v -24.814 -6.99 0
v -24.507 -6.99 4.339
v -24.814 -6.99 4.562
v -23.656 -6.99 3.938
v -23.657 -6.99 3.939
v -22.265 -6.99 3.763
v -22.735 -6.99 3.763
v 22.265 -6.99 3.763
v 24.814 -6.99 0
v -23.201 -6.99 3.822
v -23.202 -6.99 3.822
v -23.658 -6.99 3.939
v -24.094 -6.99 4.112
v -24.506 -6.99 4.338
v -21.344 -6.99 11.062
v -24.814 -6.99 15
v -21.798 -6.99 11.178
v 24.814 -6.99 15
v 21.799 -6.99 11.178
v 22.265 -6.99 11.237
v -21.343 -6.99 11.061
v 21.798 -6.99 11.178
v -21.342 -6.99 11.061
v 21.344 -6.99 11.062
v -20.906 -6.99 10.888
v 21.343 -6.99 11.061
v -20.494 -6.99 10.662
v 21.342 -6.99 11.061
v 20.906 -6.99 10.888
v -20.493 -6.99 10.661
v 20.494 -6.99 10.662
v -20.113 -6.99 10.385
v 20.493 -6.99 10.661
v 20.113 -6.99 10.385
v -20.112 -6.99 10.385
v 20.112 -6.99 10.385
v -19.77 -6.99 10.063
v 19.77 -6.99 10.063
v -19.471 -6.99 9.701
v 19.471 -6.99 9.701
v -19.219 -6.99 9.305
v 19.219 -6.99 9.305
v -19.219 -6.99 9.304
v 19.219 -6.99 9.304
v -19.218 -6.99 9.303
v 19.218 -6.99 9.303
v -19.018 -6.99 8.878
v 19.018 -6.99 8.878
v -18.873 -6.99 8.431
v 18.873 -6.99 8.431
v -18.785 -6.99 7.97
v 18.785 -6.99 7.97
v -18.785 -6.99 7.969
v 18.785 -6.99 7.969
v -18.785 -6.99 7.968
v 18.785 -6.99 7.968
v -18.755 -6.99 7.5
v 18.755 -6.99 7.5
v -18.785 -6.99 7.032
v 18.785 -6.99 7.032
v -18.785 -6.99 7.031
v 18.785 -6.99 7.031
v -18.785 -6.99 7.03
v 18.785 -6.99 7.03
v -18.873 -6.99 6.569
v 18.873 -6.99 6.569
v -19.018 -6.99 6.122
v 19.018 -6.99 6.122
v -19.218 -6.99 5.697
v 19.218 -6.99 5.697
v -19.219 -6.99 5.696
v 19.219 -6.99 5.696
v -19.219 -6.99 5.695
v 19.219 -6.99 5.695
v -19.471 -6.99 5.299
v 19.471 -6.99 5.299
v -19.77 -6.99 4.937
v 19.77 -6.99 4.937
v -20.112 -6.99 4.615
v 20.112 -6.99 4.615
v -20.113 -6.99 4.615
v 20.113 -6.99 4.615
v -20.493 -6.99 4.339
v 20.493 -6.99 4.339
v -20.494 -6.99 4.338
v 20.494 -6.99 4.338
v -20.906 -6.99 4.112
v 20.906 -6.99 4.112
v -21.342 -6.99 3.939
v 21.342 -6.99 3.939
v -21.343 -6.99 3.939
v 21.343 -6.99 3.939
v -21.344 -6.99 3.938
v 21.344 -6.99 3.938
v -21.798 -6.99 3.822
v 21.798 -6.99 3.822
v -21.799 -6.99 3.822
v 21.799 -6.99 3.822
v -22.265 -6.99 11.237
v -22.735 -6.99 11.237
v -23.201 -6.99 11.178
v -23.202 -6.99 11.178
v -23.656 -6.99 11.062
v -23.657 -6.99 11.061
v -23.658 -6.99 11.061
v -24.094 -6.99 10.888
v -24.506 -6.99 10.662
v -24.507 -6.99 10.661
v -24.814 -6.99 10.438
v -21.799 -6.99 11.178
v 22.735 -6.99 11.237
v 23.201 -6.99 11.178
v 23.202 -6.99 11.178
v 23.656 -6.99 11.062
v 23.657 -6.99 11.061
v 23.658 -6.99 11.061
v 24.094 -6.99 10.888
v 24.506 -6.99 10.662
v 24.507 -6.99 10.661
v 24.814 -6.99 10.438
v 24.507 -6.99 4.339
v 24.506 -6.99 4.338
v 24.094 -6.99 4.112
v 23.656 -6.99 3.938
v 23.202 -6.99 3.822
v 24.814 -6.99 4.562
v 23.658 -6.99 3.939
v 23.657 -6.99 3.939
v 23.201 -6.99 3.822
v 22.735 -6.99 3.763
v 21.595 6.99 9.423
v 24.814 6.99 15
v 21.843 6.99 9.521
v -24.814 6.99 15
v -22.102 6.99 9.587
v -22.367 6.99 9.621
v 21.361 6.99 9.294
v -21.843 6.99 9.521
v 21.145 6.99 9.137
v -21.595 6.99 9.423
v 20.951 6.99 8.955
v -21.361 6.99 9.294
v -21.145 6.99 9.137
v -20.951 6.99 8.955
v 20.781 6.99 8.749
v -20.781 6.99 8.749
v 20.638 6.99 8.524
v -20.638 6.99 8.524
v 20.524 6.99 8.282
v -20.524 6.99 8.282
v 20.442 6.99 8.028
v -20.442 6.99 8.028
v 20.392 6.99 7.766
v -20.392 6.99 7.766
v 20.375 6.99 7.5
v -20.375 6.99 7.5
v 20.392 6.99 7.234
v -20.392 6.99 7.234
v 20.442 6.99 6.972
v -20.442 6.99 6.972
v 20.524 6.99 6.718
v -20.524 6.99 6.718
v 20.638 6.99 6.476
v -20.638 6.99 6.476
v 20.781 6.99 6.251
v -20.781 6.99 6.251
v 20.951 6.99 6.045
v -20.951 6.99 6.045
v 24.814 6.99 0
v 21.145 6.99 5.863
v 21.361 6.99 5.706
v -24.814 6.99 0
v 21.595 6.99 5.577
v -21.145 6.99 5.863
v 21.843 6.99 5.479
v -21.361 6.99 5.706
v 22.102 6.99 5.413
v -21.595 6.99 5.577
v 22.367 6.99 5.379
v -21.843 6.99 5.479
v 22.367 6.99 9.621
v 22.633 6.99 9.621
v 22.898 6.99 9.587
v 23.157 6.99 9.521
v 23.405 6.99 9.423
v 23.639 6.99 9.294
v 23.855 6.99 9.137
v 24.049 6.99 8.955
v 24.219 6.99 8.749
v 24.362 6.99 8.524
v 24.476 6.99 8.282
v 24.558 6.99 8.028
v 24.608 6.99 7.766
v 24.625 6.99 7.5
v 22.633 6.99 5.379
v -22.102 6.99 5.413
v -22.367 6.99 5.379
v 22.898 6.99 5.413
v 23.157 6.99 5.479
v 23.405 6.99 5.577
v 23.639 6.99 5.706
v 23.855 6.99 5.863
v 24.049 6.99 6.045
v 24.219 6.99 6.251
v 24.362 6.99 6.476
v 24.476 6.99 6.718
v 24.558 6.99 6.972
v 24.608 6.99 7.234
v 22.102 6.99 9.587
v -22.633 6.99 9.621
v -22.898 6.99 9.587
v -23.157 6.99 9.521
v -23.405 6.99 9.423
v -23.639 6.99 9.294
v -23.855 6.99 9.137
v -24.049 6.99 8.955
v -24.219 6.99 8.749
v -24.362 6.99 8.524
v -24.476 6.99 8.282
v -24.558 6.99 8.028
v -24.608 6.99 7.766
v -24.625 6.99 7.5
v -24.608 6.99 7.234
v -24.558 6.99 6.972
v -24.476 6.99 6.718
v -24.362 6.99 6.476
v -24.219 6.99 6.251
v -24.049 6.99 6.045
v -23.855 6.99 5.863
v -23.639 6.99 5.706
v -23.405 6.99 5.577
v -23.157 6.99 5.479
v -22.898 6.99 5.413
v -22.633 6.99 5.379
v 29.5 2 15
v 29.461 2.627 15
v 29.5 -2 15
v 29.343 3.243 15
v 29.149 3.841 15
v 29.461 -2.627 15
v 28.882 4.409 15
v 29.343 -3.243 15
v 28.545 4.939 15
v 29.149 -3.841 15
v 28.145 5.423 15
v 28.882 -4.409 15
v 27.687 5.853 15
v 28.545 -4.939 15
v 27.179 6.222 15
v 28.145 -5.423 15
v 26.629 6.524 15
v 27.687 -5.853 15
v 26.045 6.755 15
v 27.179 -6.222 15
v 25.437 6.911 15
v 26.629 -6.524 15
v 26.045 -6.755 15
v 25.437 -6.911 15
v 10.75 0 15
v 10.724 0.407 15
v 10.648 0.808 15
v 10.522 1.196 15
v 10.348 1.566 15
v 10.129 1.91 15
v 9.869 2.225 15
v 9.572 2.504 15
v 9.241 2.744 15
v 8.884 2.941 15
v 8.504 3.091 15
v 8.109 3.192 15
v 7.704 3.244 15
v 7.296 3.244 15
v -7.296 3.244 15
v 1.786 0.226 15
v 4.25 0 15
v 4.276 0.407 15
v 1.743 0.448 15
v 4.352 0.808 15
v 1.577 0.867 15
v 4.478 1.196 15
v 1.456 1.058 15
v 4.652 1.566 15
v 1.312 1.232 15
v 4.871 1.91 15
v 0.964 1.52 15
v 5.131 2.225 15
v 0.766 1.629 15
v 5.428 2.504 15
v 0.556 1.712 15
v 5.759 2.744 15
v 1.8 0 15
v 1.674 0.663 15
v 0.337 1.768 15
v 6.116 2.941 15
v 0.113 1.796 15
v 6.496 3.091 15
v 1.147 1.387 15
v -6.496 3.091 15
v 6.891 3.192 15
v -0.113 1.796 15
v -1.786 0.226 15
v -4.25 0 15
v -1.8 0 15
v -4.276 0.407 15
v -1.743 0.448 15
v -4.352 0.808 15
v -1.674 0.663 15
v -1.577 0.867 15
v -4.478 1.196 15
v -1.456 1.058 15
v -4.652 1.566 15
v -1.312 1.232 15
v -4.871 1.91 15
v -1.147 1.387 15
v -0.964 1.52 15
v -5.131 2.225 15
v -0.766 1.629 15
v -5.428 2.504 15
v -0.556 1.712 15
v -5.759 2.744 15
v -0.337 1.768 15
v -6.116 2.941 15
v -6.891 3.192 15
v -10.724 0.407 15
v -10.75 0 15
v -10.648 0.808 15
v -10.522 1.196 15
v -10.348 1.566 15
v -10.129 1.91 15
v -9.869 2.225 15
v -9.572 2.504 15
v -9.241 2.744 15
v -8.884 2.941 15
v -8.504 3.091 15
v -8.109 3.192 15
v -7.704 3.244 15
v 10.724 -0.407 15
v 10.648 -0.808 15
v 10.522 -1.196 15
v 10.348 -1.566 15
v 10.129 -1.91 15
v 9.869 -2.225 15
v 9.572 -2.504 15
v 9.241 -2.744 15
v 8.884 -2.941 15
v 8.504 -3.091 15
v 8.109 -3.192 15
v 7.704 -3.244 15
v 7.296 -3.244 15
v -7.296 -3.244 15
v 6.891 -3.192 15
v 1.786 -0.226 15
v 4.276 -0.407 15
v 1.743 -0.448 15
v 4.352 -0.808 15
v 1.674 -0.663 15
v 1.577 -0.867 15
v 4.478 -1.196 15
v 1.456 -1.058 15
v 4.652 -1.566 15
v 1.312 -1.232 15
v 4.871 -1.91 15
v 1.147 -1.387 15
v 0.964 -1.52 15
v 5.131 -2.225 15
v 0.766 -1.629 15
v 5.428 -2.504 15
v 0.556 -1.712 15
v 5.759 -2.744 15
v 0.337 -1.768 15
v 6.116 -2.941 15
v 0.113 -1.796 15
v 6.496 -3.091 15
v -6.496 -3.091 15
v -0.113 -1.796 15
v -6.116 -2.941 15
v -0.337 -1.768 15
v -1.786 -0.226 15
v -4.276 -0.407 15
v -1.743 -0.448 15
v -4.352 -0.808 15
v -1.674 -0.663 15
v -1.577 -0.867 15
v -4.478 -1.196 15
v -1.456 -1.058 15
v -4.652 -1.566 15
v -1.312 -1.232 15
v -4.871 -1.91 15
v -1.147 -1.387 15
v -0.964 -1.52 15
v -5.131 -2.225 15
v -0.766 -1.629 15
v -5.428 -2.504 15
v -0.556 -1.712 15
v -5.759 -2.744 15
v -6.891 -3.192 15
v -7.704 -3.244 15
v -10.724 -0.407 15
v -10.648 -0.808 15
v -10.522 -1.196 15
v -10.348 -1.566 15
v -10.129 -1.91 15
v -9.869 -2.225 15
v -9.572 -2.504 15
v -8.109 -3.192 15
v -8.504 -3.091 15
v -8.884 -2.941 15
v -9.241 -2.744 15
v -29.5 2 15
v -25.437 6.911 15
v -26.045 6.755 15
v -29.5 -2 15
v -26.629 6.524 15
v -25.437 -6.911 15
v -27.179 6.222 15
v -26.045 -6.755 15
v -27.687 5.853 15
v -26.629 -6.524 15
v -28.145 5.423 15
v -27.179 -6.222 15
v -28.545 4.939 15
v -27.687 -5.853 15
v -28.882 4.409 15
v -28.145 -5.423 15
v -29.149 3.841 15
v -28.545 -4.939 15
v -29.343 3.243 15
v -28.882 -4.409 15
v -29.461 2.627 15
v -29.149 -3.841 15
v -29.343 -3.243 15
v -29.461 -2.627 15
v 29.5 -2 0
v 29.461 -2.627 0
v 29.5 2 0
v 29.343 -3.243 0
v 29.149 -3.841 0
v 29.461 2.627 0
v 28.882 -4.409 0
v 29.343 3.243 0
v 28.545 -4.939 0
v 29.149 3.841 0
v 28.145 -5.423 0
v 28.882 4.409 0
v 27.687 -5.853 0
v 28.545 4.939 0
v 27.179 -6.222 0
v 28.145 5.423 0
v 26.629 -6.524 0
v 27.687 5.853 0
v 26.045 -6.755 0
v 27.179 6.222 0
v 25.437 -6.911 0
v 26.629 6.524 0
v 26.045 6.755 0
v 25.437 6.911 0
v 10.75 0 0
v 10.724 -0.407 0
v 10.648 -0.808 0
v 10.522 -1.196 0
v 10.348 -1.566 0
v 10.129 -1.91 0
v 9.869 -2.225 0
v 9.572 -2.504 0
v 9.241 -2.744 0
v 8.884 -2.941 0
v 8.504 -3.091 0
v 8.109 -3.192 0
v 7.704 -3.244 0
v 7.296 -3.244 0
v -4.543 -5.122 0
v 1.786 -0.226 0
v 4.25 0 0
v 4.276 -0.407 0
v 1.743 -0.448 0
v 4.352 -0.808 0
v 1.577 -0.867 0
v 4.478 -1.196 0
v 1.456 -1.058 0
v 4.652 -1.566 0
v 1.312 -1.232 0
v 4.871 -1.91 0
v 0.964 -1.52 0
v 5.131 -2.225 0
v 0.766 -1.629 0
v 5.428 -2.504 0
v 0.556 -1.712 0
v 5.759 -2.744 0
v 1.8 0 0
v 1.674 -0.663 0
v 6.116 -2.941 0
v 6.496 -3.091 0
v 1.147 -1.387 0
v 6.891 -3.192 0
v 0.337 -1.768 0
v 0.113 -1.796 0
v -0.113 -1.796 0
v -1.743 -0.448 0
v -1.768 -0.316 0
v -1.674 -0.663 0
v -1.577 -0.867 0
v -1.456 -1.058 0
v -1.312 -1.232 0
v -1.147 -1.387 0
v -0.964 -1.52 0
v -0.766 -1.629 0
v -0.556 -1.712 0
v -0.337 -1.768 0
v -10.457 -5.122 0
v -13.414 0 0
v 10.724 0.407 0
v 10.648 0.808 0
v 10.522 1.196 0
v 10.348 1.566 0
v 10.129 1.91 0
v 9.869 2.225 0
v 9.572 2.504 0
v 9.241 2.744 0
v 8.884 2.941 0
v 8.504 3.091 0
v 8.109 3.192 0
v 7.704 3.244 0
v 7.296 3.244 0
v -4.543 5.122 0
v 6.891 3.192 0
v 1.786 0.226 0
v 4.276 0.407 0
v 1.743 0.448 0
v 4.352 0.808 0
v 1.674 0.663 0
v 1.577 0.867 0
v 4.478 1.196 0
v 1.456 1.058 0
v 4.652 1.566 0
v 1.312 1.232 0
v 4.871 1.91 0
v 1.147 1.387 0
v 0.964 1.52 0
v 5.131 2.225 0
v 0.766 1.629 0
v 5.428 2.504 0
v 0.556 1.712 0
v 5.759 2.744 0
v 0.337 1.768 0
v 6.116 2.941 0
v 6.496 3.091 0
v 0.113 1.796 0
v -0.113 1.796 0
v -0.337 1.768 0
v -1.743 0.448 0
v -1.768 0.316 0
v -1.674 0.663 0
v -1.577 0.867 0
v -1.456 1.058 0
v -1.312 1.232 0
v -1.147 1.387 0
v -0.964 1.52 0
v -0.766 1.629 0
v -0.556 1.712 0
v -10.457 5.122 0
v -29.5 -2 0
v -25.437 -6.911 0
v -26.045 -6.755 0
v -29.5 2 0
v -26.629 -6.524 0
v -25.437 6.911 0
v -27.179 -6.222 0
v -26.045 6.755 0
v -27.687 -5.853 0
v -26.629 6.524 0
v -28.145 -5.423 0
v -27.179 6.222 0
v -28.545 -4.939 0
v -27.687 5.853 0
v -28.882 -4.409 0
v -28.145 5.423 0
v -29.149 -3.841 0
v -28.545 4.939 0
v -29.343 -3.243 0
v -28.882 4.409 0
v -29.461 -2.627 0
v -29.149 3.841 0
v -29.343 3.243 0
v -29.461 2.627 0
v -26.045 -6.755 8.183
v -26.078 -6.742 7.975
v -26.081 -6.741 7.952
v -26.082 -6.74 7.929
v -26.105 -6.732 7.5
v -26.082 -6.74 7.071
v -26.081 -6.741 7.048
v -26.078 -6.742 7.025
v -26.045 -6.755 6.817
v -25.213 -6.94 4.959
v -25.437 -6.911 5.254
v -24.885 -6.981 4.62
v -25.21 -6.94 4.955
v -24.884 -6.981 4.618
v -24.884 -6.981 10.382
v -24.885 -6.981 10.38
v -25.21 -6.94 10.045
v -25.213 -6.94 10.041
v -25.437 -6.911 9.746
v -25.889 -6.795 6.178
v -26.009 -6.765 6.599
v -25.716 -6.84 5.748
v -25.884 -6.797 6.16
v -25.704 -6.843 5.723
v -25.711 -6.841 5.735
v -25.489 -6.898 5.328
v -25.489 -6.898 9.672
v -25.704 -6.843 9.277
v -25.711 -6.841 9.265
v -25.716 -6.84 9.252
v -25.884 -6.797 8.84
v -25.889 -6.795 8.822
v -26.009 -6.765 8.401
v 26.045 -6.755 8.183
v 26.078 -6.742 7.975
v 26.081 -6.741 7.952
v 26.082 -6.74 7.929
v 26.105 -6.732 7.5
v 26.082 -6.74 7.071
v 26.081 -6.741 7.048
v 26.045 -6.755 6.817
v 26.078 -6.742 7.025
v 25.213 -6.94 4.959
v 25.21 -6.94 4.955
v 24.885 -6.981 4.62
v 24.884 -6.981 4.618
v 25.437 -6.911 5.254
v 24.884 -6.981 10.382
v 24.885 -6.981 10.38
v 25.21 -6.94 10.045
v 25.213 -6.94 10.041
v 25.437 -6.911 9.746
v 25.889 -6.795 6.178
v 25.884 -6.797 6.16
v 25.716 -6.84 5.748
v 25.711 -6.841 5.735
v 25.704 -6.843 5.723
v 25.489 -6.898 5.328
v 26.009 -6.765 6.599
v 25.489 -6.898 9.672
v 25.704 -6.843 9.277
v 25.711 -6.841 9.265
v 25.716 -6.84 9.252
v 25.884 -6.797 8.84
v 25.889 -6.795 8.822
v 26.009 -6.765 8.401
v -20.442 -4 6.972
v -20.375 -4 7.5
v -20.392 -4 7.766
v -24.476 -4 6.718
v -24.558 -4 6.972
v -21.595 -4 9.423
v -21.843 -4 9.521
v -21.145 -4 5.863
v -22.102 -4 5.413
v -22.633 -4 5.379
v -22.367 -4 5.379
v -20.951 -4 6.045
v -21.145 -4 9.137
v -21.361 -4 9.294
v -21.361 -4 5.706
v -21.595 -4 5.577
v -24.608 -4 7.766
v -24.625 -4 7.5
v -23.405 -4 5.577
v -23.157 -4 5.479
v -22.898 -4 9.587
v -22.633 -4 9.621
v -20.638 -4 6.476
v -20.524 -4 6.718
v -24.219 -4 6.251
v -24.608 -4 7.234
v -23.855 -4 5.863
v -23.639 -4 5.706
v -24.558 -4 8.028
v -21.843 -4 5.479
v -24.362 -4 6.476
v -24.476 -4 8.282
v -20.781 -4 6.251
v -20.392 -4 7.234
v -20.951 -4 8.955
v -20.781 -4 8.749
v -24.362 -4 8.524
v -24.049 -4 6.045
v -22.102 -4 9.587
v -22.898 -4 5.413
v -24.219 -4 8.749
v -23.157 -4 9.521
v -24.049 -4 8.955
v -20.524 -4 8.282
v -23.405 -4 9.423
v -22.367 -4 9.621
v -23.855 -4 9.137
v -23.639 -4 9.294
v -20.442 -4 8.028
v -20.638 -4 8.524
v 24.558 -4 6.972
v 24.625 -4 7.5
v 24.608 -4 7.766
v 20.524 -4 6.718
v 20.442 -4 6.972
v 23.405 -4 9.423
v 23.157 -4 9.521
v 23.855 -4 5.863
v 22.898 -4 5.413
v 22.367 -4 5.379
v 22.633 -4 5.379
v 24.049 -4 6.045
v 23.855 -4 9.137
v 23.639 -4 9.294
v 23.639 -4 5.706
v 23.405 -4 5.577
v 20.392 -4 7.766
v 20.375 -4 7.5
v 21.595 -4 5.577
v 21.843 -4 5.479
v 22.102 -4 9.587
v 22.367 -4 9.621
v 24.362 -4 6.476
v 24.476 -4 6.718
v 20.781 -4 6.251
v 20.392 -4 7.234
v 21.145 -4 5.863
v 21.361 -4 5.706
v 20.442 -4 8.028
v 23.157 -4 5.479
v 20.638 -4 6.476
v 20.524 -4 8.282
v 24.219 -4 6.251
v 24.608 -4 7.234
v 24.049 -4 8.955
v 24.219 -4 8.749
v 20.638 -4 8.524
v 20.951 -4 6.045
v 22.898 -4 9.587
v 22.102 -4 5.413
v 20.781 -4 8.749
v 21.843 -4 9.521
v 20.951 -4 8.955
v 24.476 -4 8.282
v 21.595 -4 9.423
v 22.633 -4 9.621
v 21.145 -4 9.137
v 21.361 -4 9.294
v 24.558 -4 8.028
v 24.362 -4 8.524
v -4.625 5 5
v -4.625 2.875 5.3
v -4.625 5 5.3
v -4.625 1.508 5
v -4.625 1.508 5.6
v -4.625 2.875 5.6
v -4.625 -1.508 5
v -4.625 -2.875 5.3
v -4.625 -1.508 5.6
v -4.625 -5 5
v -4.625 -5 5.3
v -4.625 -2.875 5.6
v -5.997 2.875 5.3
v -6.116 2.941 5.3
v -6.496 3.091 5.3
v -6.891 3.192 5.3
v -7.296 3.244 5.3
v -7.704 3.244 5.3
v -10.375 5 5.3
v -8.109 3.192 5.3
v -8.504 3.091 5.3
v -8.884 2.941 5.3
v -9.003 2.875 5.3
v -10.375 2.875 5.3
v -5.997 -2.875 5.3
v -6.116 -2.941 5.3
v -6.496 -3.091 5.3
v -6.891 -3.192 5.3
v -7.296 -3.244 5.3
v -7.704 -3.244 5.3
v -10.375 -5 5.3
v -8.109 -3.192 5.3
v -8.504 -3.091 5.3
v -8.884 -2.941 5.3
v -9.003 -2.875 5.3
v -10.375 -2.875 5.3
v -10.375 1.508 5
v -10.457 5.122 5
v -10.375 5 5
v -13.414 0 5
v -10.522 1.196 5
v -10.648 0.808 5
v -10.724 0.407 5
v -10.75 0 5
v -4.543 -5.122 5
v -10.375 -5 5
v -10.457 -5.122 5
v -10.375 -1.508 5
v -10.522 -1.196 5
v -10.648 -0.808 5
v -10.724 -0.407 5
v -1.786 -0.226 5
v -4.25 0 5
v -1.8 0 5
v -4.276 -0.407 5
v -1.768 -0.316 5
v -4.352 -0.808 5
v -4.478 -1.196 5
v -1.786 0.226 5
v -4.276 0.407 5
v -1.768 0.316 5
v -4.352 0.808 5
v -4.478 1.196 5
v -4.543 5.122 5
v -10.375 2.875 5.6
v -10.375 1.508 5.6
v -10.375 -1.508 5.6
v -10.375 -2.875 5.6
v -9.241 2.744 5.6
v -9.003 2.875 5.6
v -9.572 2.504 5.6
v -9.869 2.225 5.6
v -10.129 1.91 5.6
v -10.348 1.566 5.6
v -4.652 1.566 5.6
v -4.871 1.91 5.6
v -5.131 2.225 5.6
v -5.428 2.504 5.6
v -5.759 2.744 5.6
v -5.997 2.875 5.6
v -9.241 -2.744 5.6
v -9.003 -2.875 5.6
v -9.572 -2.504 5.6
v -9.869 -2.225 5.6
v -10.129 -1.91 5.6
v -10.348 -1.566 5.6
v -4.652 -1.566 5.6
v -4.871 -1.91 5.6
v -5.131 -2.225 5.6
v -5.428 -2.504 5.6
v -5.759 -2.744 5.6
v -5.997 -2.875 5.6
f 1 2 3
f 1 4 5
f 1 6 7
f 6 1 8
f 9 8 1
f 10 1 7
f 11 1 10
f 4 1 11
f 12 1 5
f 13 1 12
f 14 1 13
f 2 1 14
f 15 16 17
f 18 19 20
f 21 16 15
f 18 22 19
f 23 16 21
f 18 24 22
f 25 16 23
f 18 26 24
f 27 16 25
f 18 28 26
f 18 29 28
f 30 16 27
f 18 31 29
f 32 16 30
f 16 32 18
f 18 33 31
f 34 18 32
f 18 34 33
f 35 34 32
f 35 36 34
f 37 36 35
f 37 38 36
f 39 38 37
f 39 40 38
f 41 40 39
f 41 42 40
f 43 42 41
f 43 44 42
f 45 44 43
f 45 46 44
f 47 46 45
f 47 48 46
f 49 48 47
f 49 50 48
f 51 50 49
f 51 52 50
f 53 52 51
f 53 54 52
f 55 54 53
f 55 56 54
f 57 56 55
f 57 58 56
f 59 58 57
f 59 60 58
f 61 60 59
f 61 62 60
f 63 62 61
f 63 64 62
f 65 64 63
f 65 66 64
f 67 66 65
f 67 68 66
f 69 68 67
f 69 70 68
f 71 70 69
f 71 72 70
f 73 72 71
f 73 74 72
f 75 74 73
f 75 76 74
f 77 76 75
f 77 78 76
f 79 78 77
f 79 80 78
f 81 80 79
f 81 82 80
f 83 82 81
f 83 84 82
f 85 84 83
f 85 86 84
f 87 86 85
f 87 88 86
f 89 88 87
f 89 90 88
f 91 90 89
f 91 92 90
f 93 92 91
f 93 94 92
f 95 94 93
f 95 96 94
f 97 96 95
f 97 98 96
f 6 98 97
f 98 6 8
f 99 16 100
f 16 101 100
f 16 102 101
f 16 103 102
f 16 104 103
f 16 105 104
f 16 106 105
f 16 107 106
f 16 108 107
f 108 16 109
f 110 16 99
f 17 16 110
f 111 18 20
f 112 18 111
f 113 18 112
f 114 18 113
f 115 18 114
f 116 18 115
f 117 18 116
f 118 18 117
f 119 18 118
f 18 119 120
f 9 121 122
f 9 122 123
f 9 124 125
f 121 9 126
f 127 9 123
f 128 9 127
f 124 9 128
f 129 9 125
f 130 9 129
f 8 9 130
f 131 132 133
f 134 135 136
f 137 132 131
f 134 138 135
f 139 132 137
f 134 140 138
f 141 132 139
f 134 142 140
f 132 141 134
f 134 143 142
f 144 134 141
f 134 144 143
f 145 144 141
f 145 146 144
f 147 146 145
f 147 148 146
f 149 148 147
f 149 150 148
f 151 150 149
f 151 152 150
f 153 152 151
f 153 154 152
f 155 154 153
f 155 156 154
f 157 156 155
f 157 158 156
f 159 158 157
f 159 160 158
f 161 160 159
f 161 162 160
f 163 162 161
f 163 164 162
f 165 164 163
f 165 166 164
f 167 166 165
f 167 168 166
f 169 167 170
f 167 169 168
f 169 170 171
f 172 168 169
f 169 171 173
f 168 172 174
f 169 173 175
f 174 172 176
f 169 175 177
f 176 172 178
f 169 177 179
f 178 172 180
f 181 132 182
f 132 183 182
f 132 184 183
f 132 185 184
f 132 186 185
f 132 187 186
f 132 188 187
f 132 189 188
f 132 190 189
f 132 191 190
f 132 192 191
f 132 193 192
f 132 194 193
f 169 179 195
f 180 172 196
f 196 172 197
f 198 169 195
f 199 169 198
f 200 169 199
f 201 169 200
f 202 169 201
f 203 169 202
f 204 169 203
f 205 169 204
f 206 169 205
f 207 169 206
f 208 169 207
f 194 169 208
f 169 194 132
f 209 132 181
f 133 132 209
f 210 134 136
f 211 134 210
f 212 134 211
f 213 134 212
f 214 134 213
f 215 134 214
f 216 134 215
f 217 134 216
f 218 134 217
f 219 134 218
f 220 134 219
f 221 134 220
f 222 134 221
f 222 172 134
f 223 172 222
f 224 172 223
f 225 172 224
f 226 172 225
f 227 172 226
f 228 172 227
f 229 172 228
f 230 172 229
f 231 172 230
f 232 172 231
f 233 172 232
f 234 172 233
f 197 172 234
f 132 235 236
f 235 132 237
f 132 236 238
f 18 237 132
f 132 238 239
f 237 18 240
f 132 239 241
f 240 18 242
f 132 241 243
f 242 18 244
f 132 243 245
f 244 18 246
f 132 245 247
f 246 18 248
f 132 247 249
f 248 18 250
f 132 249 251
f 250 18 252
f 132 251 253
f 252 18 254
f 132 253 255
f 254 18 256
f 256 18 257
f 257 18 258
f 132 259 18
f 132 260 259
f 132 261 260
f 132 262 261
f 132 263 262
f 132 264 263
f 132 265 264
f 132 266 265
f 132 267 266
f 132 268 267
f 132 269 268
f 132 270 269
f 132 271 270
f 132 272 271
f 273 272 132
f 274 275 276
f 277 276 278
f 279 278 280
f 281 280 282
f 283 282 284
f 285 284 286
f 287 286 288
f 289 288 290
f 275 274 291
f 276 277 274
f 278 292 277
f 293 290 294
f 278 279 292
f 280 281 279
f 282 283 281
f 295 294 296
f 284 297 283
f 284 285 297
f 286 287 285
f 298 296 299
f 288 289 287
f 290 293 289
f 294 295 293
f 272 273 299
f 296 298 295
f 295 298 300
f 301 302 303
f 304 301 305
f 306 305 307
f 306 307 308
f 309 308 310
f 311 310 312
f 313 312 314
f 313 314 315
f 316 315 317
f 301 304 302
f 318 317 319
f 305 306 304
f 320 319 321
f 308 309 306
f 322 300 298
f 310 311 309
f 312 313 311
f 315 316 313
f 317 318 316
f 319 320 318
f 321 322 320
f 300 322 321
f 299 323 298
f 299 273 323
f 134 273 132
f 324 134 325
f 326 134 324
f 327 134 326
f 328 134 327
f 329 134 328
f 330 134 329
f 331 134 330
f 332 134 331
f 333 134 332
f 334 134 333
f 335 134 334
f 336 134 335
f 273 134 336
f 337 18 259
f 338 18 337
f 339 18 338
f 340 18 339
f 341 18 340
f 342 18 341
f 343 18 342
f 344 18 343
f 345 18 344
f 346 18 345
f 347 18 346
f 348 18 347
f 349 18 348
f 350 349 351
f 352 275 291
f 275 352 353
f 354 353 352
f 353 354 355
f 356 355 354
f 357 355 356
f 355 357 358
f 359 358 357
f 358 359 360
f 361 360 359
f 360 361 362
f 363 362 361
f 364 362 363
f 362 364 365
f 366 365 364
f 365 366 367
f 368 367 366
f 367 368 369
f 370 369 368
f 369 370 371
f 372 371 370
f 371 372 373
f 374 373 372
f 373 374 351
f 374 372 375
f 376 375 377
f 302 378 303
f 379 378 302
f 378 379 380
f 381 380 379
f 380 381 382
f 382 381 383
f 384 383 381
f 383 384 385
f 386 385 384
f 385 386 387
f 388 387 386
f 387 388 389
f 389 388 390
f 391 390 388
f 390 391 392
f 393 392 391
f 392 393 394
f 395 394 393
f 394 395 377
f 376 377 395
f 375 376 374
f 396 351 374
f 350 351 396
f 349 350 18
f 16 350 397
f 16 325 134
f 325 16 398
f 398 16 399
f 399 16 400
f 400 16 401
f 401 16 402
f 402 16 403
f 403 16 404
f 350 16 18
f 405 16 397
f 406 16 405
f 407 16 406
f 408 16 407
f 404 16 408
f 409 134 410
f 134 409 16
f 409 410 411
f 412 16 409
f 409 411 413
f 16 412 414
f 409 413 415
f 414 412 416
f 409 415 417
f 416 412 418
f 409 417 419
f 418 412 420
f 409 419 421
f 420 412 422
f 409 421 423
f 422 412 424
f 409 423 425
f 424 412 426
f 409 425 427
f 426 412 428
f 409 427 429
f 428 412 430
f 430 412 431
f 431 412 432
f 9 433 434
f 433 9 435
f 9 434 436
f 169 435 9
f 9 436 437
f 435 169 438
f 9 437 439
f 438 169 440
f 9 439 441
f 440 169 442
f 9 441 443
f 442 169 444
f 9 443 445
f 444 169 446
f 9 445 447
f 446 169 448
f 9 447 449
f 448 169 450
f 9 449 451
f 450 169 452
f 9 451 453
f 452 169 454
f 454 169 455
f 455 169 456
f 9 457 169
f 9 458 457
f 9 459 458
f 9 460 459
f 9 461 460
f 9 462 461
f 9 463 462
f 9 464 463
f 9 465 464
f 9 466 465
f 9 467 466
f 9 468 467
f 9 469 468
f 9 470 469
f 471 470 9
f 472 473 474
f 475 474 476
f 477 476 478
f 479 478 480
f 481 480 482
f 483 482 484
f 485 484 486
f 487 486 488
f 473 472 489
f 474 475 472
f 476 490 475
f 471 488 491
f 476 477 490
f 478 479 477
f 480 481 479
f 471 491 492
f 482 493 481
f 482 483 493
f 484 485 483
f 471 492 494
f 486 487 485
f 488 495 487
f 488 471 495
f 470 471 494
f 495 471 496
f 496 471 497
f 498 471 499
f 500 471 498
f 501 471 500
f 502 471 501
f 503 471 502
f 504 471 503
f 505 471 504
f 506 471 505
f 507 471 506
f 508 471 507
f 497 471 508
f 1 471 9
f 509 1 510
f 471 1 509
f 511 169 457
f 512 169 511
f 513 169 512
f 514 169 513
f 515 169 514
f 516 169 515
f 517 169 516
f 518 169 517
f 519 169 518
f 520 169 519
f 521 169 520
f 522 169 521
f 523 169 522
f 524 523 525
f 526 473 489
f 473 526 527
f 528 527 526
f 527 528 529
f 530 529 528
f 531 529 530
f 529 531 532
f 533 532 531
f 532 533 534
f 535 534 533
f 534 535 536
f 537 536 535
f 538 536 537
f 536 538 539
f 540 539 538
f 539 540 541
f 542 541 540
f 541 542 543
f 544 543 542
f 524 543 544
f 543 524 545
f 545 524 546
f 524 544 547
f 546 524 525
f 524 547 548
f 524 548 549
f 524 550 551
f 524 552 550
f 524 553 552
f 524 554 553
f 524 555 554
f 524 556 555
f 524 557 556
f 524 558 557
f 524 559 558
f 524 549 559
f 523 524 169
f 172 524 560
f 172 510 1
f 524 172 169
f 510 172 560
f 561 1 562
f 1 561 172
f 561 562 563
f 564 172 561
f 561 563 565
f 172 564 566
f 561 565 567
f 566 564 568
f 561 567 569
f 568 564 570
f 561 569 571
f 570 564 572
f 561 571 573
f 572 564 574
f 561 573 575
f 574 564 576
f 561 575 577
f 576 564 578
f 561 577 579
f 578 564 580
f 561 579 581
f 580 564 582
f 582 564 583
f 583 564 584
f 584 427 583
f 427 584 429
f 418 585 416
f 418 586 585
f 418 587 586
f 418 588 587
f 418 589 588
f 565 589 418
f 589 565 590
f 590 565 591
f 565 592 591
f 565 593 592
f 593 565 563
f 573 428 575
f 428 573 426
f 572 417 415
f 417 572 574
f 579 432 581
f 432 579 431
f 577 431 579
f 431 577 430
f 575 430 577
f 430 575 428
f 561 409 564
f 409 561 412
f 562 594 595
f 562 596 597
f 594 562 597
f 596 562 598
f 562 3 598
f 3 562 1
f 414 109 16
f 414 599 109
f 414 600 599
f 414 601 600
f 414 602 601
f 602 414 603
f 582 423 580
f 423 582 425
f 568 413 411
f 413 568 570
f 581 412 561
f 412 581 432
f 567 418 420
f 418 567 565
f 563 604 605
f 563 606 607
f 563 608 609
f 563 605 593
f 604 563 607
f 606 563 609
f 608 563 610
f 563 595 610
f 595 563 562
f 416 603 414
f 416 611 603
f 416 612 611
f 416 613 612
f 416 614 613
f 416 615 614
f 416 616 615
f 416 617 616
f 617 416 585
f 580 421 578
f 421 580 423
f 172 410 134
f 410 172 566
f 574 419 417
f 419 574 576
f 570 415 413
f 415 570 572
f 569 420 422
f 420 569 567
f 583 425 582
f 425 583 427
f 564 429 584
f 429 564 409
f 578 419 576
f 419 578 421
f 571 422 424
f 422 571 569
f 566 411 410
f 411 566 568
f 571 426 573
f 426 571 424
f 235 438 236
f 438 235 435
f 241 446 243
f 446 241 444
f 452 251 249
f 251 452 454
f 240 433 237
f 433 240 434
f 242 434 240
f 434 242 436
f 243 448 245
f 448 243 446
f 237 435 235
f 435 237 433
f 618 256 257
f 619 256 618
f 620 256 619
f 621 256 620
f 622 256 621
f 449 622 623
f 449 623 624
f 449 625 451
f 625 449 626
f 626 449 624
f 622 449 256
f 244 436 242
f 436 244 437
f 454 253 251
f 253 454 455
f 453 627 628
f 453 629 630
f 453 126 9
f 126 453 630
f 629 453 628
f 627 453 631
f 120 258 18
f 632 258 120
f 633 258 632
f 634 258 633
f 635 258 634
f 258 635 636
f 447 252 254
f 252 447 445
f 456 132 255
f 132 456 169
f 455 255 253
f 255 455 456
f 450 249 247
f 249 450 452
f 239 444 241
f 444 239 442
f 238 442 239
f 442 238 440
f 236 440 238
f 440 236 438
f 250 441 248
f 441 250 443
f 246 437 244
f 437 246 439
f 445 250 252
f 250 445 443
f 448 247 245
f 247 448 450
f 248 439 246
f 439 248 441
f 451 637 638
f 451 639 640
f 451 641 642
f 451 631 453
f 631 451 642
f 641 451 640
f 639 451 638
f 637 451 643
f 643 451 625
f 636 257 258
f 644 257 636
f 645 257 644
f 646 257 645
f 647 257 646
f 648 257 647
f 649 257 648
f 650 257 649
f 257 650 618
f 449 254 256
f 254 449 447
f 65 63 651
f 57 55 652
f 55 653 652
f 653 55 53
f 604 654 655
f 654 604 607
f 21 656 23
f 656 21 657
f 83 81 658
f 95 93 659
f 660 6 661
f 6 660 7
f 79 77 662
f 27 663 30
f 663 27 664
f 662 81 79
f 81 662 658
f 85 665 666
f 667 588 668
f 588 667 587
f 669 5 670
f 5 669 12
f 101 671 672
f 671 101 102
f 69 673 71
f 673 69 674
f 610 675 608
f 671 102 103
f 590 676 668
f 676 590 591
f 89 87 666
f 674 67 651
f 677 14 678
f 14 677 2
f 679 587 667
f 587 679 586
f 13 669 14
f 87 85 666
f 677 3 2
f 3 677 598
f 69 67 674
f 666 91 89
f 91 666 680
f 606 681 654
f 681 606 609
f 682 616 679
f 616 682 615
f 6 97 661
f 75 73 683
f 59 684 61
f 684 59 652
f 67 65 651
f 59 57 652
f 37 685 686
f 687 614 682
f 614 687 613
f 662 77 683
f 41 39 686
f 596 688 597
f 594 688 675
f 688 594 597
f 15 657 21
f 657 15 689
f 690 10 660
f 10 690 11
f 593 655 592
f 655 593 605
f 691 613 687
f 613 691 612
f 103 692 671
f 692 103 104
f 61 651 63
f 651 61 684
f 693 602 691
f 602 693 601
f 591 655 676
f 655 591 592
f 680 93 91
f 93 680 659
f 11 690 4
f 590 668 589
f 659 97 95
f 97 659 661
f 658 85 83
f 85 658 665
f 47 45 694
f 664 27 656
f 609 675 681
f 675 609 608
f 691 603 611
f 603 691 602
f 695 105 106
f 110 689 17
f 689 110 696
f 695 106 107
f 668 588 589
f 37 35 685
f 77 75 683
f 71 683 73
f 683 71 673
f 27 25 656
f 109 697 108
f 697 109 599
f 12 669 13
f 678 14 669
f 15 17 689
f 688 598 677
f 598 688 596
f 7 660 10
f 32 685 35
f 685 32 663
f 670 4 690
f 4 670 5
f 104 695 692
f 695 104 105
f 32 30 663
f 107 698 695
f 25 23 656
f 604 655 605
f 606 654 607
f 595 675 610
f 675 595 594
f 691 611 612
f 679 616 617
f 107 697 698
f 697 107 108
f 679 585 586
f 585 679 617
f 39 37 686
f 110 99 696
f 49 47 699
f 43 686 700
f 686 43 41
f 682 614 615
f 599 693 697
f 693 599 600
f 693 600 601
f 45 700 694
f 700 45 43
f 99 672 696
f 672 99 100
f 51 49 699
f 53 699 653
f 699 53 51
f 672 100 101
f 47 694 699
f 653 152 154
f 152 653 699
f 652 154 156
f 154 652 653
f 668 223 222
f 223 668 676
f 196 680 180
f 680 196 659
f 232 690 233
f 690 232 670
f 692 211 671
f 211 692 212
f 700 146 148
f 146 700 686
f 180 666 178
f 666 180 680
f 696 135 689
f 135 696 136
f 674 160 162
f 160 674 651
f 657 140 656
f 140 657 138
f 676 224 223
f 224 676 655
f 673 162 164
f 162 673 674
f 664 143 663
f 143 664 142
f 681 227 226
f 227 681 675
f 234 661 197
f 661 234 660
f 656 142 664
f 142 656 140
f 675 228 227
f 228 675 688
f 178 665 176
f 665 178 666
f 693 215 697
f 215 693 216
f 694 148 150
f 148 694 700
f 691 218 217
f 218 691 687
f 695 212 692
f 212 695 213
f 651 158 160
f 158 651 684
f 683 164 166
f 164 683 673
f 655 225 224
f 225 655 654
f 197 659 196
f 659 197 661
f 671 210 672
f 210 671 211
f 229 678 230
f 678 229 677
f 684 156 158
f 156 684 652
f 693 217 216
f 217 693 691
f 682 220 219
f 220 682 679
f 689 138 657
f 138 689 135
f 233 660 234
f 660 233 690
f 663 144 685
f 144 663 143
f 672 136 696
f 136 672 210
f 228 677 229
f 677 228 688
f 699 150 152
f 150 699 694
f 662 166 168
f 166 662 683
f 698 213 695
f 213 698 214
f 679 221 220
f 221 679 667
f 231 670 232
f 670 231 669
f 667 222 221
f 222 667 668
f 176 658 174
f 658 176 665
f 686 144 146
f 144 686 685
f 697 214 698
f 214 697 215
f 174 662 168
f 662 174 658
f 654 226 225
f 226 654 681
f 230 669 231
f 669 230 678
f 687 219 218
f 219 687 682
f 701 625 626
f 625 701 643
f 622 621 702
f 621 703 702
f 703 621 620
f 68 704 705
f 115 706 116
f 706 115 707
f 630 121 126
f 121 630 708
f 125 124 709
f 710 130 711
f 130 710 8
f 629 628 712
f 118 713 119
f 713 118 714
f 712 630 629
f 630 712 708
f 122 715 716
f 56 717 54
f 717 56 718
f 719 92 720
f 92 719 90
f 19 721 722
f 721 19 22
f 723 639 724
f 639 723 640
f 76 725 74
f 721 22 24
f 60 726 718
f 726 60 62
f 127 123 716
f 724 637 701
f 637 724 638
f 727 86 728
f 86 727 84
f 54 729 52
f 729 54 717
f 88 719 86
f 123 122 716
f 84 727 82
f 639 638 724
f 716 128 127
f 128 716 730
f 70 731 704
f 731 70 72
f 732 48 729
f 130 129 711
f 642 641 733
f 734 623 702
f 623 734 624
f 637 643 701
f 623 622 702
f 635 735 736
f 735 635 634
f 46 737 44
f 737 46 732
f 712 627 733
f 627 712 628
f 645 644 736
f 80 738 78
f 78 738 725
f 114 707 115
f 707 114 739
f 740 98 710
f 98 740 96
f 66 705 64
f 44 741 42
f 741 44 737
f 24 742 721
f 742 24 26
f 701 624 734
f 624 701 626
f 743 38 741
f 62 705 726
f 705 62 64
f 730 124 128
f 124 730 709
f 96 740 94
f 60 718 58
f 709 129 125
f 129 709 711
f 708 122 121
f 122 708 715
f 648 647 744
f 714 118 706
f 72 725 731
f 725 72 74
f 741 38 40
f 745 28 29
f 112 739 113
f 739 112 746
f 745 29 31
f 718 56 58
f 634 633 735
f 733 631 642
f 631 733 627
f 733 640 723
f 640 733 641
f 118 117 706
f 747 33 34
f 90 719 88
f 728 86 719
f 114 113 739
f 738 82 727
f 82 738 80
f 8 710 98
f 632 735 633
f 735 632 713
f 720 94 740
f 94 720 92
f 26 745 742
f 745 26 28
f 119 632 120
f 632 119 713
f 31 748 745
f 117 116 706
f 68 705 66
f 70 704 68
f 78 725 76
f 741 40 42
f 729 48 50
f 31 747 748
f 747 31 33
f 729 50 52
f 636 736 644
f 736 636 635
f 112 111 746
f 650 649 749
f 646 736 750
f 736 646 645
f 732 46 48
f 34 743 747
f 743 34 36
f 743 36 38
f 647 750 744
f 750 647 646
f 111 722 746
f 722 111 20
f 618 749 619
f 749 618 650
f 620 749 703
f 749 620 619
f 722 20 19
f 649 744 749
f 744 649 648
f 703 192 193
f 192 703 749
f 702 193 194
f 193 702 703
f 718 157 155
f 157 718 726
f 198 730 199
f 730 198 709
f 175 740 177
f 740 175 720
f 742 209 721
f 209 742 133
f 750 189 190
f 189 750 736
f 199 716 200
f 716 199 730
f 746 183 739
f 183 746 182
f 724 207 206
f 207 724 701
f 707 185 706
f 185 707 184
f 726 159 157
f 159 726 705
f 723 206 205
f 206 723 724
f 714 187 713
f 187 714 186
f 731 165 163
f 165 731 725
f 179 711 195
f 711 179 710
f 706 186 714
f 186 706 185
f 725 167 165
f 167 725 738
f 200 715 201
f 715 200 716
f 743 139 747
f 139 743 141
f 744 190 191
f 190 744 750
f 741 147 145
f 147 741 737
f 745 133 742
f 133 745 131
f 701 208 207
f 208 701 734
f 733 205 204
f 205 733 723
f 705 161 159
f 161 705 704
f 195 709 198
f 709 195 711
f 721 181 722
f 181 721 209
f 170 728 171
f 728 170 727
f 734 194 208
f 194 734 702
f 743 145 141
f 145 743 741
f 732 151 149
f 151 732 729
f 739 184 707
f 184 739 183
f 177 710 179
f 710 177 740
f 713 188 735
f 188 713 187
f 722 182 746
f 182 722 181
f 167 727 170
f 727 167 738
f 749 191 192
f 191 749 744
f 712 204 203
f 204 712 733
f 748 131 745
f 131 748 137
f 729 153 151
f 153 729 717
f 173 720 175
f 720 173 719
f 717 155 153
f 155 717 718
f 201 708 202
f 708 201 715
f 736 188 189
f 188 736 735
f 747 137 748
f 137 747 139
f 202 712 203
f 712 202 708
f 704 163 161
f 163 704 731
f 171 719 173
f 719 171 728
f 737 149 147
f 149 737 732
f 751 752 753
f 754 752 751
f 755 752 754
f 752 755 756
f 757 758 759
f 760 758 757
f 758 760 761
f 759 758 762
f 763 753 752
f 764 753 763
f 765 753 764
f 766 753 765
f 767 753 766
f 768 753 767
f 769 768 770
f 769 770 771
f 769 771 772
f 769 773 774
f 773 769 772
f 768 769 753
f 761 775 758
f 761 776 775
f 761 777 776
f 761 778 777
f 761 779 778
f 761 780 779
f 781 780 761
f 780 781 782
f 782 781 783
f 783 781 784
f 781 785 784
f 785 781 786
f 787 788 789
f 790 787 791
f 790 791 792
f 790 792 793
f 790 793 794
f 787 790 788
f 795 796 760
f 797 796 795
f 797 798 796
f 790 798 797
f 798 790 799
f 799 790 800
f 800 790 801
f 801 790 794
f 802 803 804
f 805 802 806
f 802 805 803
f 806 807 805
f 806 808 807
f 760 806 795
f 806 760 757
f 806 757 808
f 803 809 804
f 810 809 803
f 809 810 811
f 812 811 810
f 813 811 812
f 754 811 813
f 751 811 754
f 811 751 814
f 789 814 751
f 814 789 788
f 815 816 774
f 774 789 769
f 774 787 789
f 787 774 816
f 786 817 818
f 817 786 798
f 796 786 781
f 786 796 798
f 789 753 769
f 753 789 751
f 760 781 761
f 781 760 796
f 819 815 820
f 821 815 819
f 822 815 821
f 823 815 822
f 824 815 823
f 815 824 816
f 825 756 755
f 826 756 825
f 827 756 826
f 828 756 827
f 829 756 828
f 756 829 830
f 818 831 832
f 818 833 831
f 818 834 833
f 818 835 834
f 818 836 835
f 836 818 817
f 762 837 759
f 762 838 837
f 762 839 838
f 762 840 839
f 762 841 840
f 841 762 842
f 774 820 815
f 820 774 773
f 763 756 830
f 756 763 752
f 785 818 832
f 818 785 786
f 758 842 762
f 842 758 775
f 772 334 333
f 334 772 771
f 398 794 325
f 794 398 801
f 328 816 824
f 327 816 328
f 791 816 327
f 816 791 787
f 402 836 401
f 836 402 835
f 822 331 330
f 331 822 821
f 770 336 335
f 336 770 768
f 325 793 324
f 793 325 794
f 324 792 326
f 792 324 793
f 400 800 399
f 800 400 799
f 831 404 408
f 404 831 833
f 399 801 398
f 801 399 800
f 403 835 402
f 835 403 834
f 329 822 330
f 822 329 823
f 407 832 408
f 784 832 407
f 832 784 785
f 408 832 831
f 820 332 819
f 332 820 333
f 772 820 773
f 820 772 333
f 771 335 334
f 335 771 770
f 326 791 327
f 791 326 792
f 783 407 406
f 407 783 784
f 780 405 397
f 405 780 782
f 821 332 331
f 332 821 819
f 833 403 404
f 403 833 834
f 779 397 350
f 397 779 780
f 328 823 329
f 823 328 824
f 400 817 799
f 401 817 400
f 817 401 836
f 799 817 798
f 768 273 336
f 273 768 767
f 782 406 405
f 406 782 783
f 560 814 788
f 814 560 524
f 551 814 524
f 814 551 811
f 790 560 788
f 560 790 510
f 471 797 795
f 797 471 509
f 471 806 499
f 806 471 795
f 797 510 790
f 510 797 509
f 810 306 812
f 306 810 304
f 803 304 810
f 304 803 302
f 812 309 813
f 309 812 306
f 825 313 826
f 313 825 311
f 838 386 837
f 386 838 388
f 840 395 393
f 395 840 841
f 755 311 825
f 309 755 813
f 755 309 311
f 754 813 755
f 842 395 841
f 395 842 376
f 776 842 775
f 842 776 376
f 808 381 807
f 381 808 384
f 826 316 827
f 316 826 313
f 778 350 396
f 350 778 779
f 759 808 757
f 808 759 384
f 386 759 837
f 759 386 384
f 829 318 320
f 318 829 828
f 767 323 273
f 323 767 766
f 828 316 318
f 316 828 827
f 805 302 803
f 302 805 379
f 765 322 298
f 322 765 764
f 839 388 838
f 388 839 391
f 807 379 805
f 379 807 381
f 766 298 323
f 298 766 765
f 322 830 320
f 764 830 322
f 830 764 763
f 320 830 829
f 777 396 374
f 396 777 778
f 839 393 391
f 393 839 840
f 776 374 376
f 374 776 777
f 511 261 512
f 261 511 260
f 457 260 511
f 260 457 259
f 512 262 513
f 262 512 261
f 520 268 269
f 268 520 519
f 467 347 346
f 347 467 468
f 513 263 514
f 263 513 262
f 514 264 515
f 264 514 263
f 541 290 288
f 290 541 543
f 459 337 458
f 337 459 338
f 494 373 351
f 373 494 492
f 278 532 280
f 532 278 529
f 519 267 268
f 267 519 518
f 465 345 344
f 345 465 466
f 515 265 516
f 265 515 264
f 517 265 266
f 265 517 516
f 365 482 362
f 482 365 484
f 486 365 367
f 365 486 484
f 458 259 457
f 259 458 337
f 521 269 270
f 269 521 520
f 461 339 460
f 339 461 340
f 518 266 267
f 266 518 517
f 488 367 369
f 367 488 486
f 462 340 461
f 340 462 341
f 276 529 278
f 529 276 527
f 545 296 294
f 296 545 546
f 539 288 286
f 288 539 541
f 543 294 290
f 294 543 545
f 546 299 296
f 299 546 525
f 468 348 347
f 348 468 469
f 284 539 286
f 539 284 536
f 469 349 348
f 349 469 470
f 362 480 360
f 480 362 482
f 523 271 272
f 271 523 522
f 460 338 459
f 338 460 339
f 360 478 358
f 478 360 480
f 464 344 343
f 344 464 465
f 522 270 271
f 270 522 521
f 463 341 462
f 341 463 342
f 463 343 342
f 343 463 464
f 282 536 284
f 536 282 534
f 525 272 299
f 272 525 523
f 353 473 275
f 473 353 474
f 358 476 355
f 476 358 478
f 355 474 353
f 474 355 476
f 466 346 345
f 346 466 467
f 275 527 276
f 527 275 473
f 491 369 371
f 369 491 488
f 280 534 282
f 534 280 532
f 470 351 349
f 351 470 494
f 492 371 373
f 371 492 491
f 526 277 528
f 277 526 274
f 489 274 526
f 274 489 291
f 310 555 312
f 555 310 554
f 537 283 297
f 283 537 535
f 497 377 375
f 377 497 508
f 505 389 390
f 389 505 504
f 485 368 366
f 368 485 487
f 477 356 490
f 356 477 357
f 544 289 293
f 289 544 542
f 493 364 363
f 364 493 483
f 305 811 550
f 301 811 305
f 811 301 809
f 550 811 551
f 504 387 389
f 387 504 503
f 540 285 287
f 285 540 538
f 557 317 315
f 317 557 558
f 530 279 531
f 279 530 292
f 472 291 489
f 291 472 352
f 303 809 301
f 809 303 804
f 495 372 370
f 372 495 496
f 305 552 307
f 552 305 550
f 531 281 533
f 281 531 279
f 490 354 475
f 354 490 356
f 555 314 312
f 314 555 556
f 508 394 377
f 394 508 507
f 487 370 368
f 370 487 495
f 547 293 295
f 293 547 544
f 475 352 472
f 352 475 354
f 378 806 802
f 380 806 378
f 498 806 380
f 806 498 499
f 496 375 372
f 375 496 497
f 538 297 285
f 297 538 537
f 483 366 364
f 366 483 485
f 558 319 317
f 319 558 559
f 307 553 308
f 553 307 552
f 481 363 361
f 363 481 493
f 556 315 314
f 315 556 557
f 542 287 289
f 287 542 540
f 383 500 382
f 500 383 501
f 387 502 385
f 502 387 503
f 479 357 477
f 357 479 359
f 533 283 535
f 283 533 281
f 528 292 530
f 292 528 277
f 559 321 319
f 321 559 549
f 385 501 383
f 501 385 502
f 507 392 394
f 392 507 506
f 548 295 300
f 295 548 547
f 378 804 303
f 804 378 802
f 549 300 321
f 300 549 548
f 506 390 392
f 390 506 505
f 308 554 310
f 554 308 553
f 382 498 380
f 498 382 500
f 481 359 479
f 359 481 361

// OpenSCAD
$fn = 50;


difference() {
	union() {
		hull() {
			translate(v = [-9.5000000000, 2.0000000000, 0]) {
				cylinder(h = 15, r = 5);
			}
			translate(v = [9.5000000000, 2.0000000000, 0]) {
				cylinder(h = 15, r = 5);
			}
			translate(v = [-9.5000000000, -2.0000000000, 0]) {
				cylinder(h = 15, r = 5);
			}
			translate(v = [9.5000000000, -2.0000000000, 0]) {
				cylinder(h = 15, r = 5);
			}
		}
		translate(v = [-15.0000000000, 0.0000000000, 0]) {
			hull() {
				translate(v = [-9.5000000000, 2.0000000000, 0]) {
					cylinder(h = 15, r = 5);
				}
				translate(v = [9.5000000000, 2.0000000000, 0]) {
					cylinder(h = 15, r = 5);
				}
				translate(v = [-9.5000000000, -2.0000000000, 0]) {
					cylinder(h = 15, r = 5);
				}
				translate(v = [9.5000000000, -2.0000000000, 0]) {
					cylinder(h = 15, r = 5);
				}
			}
		}
		translate(v = [15.0000000000, 0.0000000000, 0]) {
			hull() {
				translate(v = [-9.5000000000, 2.0000000000, 0]) {
					cylinder(h = 15, r = 5);
				}
				translate(v = [9.5000000000, 2.0000000000, 0]) {
					cylinder(h = 15, r = 5);
				}
				translate(v = [-9.5000000000, -2.0000000000, 0]) {
					cylinder(h = 15, r = 5);
				}
				translate(v = [9.5000000000, -2.0000000000, 0]) {
					cylinder(h = 15, r = 5);
				}
			}
		}
	}
	union() {
		translate(v = [-22.5000000000, -7.0000000000, 7.5000000000]) {
			rotate(a = [90, 0, 0]) {
				difference() {
					union() {
						#translate(v = [0, 0, -14.0000000000]) {
							cylinder(h = 14, r = 2.0000000000);
						}
						#translate(v = [0, 0, -3]) {
							cylinder(h = 3, r1 = 2.1250000000, r2 = 3.7500000000);
						}
						#translate(v = [0, 0, -14.0000000000]) {
							cylinder(h = 14, r = 2.1250000000);
						}
						#translate(v = [0, 0, -14.0000000000]) {
							cylinder(h = 14, r = 2.0000000000);
						}
					}
					union();
				}
			}
		}
		translate(v = [22.5000000000, -7.0000000000, 7.5000000000]) {
			rotate(a = [90, 0, 0]) {
				difference() {
					union() {
						#translate(v = [0, 0, -14.0000000000]) {
							cylinder(h = 14, r = 2.0000000000);
						}
						#translate(v = [0, 0, -3]) {
							cylinder(h = 3, r1 = 2.1250000000, r2 = 3.7500000000);
						}
						#translate(v = [0, 0, -14.0000000000]) {
							cylinder(h = 14, r = 2.1250000000);
						}
						#translate(v = [0, 0, -14.0000000000]) {
							cylinder(h = 14, r = 2.0000000000);
						}
					}
					union();
				}
			}
		}
		translate(v = [-7.5000000000, 0.0000000000, 0]) {
			rotate(a = [0, 0, 0]) {
				difference() {
					union() {
						#translate(v = [-2.8750000000, -5.0000000000, -0.3000000000]) {
							cube(size = [5.7500000000, 10, 0.3000000000]);
						}
						#translate(v = [-2.8750000000, -2.8750000000, -0.6000000000]) {
							cube(size = [5.7500000000, 5.7500000000, 0.3000000000]);
						}
						#translate(v = [-2.8750000000, -5.0000000000, 5]) {
							cube(size = [5.7500000000, 10, 0.3000000000]);
						}
						#translate(v = [-2.8750000000, -2.8750000000, 5.3000000000]) {
							cube(size = [5.7500000000, 5.7500000000, 0.3000000000]);
						}
						#translate(v = [0, 0, -100.0000000000]) {
							cylinder(h = 200, r = 3.2500000000);
						}
						#linear_extrude(height = 5) {
							polygon(points = [[5.9142500000, 0.0000000000], [2.9571250000, 5.1218907443], [-2.9571250000, 5.1218907443], [-5.9142500000, 0.0000000000], [-2.9571250000, -5.1218907443], [2.9571250000, -5.1218907443]]);
						}
						#translate(v = [-2.8750000000, -5.0000000000, -0.3000000000]) {
							cube(size = [5.7500000000, 10, 0.3000000000]);
						}
						#translate(v = [-2.8750000000, -2.8750000000, -0.6000000000]) {
							cube(size = [5.7500000000, 5.7500000000, 0.3000000000]);
						}
						#translate(v = [-2.8750000000, -5.0000000000, 5]) {
							cube(size = [5.7500000000, 10, 0.3000000000]);
						}
						#translate(v = [-2.8750000000, -2.8750000000, 5.3000000000]) {
							cube(size = [5.7500000000, 5.7500000000, 0.3000000000]);
						}
						#translate(v = [0, 0, -100.0000000000]) {
							cylinder(h = 200, r = 3.2500000000);
						}
						#translate(v = [-2.8750000000, -5.0000000000, -0.3000000000]) {
							cube(size = [5.7500000000, 10, 0.3000000000]);
						}
						#translate(v = [-2.8750000000, -2.8750000000, -0.6000000000]) {
							cube(size = [5.7500000000, 5.7500000000, 0.3000000000]);
						}
						#translate(v = [-2.8750000000, -5.0000000000, 5]) {
							cube(size = [5.7500000000, 10, 0.3000000000]);
						}
						#translate(v = [-2.8750000000, -2.8750000000, 5.3000000000]) {
							cube(size = [5.7500000000, 5.7500000000, 0.3000000000]);
						}
						#translate(v = [0, 0, -100.0000000000]) {
							cylinder(h = 200, r = 3.2500000000);
						}
					}
					union();
				}
			}
		}
		translate(v = [-7.5000000000, 0.0000000000, 0]) {
			translate(v = [0, 0, -100]) {
				cylinder(h = 200, r = 3.2500000000);
			}
		}
		translate(v = [7.5000000000, 0.0000000000, 0]) {
			translate(v = [0, 0, -100]) {
				cylinder(h = 200, r = 3.2500000000);
			}
		}
		translate(v = [-7.5000000000, 0.0000000000, 0]) {
			translate(v = [0, 0, -100]) {
				cylinder(h = 200, r = 1.8000000000);
			}
		}
		translate(v = [0, 0, -100]) {
			cylinder(h = 200, r = 1.8000000000);
		}
		translate(v = [7.5000000000, 0.0000000000, 0]) {
			translate(v = [0, 0, -100]) {
				cylinder(h = 200, r = 1.8000000000);
			}
		}
	}
}
